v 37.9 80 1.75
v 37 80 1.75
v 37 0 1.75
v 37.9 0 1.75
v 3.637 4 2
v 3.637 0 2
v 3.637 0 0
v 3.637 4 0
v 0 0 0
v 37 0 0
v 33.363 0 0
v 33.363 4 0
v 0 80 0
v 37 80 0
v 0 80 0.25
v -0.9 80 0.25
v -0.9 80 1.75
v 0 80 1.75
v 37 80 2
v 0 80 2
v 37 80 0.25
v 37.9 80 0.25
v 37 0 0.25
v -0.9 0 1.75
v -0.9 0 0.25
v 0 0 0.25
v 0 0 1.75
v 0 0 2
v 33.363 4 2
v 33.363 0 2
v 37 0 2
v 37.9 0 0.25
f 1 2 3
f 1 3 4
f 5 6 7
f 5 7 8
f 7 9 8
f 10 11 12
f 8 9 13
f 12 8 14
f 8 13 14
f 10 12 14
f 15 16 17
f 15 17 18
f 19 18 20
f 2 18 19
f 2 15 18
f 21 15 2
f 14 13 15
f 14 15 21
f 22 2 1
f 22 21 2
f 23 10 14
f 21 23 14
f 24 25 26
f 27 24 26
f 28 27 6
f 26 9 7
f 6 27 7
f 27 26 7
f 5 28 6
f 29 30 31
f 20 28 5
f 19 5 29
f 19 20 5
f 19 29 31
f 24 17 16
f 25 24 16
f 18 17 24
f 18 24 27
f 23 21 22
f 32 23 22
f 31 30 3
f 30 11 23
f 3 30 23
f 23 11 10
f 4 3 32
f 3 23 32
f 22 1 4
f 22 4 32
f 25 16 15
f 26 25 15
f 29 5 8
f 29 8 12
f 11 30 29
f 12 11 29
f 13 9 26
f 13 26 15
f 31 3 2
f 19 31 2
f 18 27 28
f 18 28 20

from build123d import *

# Parameters (mm, degrees)
SKETCH1_W           = 37
SKETCH1_H           = 80
BOSS_EXTRUDE1_DEPTH = 2
SKETCH2_W           = 0.9
SKETCH2_H           = 1.5
BOSS_EXTRUDE2_DEPTH = 80
SKETCH3_W           = 29.726914408
SKETCH3_H           = 4
CUT_EXTRUDE1_DEPTH  = 2


with BuildPart() as part:
    # Sketch1 → Boss-Extrude1 (new body)
    with BuildSketch(Plane.XY):
        with Locations((18.5, 40)):
            Rectangle(SKETCH1_W, SKETCH1_H)
    extrude(amount=BOSS_EXTRUDE1_DEPTH)

    # Sketch2 → Boss-Extrude2 (add)
    with BuildSketch(Plane(origin=(0, 80, 0), x_dir=(1, 0, 0), z_dir=(0, 1, 0))):
        with Locations((37.45, -1)):
            Rectangle(SKETCH2_W, SKETCH2_H)
        with Locations((-0.45, -1)):
            Rectangle(SKETCH2_W, SKETCH2_H)
    extrude(amount=-BOSS_EXTRUDE2_DEPTH)

    # Sketch3 → Cut-Extrude1 (cut)
    with BuildSketch(Plane.XY.offset(2)):
        with Locations((18.5, 2)):
            Rectangle(SKETCH3_W, SKETCH3_H)
    extrude(amount=-CUT_EXTRUDE1_DEPTH, mode=Mode.SUBTRACT)


solid = part.part
